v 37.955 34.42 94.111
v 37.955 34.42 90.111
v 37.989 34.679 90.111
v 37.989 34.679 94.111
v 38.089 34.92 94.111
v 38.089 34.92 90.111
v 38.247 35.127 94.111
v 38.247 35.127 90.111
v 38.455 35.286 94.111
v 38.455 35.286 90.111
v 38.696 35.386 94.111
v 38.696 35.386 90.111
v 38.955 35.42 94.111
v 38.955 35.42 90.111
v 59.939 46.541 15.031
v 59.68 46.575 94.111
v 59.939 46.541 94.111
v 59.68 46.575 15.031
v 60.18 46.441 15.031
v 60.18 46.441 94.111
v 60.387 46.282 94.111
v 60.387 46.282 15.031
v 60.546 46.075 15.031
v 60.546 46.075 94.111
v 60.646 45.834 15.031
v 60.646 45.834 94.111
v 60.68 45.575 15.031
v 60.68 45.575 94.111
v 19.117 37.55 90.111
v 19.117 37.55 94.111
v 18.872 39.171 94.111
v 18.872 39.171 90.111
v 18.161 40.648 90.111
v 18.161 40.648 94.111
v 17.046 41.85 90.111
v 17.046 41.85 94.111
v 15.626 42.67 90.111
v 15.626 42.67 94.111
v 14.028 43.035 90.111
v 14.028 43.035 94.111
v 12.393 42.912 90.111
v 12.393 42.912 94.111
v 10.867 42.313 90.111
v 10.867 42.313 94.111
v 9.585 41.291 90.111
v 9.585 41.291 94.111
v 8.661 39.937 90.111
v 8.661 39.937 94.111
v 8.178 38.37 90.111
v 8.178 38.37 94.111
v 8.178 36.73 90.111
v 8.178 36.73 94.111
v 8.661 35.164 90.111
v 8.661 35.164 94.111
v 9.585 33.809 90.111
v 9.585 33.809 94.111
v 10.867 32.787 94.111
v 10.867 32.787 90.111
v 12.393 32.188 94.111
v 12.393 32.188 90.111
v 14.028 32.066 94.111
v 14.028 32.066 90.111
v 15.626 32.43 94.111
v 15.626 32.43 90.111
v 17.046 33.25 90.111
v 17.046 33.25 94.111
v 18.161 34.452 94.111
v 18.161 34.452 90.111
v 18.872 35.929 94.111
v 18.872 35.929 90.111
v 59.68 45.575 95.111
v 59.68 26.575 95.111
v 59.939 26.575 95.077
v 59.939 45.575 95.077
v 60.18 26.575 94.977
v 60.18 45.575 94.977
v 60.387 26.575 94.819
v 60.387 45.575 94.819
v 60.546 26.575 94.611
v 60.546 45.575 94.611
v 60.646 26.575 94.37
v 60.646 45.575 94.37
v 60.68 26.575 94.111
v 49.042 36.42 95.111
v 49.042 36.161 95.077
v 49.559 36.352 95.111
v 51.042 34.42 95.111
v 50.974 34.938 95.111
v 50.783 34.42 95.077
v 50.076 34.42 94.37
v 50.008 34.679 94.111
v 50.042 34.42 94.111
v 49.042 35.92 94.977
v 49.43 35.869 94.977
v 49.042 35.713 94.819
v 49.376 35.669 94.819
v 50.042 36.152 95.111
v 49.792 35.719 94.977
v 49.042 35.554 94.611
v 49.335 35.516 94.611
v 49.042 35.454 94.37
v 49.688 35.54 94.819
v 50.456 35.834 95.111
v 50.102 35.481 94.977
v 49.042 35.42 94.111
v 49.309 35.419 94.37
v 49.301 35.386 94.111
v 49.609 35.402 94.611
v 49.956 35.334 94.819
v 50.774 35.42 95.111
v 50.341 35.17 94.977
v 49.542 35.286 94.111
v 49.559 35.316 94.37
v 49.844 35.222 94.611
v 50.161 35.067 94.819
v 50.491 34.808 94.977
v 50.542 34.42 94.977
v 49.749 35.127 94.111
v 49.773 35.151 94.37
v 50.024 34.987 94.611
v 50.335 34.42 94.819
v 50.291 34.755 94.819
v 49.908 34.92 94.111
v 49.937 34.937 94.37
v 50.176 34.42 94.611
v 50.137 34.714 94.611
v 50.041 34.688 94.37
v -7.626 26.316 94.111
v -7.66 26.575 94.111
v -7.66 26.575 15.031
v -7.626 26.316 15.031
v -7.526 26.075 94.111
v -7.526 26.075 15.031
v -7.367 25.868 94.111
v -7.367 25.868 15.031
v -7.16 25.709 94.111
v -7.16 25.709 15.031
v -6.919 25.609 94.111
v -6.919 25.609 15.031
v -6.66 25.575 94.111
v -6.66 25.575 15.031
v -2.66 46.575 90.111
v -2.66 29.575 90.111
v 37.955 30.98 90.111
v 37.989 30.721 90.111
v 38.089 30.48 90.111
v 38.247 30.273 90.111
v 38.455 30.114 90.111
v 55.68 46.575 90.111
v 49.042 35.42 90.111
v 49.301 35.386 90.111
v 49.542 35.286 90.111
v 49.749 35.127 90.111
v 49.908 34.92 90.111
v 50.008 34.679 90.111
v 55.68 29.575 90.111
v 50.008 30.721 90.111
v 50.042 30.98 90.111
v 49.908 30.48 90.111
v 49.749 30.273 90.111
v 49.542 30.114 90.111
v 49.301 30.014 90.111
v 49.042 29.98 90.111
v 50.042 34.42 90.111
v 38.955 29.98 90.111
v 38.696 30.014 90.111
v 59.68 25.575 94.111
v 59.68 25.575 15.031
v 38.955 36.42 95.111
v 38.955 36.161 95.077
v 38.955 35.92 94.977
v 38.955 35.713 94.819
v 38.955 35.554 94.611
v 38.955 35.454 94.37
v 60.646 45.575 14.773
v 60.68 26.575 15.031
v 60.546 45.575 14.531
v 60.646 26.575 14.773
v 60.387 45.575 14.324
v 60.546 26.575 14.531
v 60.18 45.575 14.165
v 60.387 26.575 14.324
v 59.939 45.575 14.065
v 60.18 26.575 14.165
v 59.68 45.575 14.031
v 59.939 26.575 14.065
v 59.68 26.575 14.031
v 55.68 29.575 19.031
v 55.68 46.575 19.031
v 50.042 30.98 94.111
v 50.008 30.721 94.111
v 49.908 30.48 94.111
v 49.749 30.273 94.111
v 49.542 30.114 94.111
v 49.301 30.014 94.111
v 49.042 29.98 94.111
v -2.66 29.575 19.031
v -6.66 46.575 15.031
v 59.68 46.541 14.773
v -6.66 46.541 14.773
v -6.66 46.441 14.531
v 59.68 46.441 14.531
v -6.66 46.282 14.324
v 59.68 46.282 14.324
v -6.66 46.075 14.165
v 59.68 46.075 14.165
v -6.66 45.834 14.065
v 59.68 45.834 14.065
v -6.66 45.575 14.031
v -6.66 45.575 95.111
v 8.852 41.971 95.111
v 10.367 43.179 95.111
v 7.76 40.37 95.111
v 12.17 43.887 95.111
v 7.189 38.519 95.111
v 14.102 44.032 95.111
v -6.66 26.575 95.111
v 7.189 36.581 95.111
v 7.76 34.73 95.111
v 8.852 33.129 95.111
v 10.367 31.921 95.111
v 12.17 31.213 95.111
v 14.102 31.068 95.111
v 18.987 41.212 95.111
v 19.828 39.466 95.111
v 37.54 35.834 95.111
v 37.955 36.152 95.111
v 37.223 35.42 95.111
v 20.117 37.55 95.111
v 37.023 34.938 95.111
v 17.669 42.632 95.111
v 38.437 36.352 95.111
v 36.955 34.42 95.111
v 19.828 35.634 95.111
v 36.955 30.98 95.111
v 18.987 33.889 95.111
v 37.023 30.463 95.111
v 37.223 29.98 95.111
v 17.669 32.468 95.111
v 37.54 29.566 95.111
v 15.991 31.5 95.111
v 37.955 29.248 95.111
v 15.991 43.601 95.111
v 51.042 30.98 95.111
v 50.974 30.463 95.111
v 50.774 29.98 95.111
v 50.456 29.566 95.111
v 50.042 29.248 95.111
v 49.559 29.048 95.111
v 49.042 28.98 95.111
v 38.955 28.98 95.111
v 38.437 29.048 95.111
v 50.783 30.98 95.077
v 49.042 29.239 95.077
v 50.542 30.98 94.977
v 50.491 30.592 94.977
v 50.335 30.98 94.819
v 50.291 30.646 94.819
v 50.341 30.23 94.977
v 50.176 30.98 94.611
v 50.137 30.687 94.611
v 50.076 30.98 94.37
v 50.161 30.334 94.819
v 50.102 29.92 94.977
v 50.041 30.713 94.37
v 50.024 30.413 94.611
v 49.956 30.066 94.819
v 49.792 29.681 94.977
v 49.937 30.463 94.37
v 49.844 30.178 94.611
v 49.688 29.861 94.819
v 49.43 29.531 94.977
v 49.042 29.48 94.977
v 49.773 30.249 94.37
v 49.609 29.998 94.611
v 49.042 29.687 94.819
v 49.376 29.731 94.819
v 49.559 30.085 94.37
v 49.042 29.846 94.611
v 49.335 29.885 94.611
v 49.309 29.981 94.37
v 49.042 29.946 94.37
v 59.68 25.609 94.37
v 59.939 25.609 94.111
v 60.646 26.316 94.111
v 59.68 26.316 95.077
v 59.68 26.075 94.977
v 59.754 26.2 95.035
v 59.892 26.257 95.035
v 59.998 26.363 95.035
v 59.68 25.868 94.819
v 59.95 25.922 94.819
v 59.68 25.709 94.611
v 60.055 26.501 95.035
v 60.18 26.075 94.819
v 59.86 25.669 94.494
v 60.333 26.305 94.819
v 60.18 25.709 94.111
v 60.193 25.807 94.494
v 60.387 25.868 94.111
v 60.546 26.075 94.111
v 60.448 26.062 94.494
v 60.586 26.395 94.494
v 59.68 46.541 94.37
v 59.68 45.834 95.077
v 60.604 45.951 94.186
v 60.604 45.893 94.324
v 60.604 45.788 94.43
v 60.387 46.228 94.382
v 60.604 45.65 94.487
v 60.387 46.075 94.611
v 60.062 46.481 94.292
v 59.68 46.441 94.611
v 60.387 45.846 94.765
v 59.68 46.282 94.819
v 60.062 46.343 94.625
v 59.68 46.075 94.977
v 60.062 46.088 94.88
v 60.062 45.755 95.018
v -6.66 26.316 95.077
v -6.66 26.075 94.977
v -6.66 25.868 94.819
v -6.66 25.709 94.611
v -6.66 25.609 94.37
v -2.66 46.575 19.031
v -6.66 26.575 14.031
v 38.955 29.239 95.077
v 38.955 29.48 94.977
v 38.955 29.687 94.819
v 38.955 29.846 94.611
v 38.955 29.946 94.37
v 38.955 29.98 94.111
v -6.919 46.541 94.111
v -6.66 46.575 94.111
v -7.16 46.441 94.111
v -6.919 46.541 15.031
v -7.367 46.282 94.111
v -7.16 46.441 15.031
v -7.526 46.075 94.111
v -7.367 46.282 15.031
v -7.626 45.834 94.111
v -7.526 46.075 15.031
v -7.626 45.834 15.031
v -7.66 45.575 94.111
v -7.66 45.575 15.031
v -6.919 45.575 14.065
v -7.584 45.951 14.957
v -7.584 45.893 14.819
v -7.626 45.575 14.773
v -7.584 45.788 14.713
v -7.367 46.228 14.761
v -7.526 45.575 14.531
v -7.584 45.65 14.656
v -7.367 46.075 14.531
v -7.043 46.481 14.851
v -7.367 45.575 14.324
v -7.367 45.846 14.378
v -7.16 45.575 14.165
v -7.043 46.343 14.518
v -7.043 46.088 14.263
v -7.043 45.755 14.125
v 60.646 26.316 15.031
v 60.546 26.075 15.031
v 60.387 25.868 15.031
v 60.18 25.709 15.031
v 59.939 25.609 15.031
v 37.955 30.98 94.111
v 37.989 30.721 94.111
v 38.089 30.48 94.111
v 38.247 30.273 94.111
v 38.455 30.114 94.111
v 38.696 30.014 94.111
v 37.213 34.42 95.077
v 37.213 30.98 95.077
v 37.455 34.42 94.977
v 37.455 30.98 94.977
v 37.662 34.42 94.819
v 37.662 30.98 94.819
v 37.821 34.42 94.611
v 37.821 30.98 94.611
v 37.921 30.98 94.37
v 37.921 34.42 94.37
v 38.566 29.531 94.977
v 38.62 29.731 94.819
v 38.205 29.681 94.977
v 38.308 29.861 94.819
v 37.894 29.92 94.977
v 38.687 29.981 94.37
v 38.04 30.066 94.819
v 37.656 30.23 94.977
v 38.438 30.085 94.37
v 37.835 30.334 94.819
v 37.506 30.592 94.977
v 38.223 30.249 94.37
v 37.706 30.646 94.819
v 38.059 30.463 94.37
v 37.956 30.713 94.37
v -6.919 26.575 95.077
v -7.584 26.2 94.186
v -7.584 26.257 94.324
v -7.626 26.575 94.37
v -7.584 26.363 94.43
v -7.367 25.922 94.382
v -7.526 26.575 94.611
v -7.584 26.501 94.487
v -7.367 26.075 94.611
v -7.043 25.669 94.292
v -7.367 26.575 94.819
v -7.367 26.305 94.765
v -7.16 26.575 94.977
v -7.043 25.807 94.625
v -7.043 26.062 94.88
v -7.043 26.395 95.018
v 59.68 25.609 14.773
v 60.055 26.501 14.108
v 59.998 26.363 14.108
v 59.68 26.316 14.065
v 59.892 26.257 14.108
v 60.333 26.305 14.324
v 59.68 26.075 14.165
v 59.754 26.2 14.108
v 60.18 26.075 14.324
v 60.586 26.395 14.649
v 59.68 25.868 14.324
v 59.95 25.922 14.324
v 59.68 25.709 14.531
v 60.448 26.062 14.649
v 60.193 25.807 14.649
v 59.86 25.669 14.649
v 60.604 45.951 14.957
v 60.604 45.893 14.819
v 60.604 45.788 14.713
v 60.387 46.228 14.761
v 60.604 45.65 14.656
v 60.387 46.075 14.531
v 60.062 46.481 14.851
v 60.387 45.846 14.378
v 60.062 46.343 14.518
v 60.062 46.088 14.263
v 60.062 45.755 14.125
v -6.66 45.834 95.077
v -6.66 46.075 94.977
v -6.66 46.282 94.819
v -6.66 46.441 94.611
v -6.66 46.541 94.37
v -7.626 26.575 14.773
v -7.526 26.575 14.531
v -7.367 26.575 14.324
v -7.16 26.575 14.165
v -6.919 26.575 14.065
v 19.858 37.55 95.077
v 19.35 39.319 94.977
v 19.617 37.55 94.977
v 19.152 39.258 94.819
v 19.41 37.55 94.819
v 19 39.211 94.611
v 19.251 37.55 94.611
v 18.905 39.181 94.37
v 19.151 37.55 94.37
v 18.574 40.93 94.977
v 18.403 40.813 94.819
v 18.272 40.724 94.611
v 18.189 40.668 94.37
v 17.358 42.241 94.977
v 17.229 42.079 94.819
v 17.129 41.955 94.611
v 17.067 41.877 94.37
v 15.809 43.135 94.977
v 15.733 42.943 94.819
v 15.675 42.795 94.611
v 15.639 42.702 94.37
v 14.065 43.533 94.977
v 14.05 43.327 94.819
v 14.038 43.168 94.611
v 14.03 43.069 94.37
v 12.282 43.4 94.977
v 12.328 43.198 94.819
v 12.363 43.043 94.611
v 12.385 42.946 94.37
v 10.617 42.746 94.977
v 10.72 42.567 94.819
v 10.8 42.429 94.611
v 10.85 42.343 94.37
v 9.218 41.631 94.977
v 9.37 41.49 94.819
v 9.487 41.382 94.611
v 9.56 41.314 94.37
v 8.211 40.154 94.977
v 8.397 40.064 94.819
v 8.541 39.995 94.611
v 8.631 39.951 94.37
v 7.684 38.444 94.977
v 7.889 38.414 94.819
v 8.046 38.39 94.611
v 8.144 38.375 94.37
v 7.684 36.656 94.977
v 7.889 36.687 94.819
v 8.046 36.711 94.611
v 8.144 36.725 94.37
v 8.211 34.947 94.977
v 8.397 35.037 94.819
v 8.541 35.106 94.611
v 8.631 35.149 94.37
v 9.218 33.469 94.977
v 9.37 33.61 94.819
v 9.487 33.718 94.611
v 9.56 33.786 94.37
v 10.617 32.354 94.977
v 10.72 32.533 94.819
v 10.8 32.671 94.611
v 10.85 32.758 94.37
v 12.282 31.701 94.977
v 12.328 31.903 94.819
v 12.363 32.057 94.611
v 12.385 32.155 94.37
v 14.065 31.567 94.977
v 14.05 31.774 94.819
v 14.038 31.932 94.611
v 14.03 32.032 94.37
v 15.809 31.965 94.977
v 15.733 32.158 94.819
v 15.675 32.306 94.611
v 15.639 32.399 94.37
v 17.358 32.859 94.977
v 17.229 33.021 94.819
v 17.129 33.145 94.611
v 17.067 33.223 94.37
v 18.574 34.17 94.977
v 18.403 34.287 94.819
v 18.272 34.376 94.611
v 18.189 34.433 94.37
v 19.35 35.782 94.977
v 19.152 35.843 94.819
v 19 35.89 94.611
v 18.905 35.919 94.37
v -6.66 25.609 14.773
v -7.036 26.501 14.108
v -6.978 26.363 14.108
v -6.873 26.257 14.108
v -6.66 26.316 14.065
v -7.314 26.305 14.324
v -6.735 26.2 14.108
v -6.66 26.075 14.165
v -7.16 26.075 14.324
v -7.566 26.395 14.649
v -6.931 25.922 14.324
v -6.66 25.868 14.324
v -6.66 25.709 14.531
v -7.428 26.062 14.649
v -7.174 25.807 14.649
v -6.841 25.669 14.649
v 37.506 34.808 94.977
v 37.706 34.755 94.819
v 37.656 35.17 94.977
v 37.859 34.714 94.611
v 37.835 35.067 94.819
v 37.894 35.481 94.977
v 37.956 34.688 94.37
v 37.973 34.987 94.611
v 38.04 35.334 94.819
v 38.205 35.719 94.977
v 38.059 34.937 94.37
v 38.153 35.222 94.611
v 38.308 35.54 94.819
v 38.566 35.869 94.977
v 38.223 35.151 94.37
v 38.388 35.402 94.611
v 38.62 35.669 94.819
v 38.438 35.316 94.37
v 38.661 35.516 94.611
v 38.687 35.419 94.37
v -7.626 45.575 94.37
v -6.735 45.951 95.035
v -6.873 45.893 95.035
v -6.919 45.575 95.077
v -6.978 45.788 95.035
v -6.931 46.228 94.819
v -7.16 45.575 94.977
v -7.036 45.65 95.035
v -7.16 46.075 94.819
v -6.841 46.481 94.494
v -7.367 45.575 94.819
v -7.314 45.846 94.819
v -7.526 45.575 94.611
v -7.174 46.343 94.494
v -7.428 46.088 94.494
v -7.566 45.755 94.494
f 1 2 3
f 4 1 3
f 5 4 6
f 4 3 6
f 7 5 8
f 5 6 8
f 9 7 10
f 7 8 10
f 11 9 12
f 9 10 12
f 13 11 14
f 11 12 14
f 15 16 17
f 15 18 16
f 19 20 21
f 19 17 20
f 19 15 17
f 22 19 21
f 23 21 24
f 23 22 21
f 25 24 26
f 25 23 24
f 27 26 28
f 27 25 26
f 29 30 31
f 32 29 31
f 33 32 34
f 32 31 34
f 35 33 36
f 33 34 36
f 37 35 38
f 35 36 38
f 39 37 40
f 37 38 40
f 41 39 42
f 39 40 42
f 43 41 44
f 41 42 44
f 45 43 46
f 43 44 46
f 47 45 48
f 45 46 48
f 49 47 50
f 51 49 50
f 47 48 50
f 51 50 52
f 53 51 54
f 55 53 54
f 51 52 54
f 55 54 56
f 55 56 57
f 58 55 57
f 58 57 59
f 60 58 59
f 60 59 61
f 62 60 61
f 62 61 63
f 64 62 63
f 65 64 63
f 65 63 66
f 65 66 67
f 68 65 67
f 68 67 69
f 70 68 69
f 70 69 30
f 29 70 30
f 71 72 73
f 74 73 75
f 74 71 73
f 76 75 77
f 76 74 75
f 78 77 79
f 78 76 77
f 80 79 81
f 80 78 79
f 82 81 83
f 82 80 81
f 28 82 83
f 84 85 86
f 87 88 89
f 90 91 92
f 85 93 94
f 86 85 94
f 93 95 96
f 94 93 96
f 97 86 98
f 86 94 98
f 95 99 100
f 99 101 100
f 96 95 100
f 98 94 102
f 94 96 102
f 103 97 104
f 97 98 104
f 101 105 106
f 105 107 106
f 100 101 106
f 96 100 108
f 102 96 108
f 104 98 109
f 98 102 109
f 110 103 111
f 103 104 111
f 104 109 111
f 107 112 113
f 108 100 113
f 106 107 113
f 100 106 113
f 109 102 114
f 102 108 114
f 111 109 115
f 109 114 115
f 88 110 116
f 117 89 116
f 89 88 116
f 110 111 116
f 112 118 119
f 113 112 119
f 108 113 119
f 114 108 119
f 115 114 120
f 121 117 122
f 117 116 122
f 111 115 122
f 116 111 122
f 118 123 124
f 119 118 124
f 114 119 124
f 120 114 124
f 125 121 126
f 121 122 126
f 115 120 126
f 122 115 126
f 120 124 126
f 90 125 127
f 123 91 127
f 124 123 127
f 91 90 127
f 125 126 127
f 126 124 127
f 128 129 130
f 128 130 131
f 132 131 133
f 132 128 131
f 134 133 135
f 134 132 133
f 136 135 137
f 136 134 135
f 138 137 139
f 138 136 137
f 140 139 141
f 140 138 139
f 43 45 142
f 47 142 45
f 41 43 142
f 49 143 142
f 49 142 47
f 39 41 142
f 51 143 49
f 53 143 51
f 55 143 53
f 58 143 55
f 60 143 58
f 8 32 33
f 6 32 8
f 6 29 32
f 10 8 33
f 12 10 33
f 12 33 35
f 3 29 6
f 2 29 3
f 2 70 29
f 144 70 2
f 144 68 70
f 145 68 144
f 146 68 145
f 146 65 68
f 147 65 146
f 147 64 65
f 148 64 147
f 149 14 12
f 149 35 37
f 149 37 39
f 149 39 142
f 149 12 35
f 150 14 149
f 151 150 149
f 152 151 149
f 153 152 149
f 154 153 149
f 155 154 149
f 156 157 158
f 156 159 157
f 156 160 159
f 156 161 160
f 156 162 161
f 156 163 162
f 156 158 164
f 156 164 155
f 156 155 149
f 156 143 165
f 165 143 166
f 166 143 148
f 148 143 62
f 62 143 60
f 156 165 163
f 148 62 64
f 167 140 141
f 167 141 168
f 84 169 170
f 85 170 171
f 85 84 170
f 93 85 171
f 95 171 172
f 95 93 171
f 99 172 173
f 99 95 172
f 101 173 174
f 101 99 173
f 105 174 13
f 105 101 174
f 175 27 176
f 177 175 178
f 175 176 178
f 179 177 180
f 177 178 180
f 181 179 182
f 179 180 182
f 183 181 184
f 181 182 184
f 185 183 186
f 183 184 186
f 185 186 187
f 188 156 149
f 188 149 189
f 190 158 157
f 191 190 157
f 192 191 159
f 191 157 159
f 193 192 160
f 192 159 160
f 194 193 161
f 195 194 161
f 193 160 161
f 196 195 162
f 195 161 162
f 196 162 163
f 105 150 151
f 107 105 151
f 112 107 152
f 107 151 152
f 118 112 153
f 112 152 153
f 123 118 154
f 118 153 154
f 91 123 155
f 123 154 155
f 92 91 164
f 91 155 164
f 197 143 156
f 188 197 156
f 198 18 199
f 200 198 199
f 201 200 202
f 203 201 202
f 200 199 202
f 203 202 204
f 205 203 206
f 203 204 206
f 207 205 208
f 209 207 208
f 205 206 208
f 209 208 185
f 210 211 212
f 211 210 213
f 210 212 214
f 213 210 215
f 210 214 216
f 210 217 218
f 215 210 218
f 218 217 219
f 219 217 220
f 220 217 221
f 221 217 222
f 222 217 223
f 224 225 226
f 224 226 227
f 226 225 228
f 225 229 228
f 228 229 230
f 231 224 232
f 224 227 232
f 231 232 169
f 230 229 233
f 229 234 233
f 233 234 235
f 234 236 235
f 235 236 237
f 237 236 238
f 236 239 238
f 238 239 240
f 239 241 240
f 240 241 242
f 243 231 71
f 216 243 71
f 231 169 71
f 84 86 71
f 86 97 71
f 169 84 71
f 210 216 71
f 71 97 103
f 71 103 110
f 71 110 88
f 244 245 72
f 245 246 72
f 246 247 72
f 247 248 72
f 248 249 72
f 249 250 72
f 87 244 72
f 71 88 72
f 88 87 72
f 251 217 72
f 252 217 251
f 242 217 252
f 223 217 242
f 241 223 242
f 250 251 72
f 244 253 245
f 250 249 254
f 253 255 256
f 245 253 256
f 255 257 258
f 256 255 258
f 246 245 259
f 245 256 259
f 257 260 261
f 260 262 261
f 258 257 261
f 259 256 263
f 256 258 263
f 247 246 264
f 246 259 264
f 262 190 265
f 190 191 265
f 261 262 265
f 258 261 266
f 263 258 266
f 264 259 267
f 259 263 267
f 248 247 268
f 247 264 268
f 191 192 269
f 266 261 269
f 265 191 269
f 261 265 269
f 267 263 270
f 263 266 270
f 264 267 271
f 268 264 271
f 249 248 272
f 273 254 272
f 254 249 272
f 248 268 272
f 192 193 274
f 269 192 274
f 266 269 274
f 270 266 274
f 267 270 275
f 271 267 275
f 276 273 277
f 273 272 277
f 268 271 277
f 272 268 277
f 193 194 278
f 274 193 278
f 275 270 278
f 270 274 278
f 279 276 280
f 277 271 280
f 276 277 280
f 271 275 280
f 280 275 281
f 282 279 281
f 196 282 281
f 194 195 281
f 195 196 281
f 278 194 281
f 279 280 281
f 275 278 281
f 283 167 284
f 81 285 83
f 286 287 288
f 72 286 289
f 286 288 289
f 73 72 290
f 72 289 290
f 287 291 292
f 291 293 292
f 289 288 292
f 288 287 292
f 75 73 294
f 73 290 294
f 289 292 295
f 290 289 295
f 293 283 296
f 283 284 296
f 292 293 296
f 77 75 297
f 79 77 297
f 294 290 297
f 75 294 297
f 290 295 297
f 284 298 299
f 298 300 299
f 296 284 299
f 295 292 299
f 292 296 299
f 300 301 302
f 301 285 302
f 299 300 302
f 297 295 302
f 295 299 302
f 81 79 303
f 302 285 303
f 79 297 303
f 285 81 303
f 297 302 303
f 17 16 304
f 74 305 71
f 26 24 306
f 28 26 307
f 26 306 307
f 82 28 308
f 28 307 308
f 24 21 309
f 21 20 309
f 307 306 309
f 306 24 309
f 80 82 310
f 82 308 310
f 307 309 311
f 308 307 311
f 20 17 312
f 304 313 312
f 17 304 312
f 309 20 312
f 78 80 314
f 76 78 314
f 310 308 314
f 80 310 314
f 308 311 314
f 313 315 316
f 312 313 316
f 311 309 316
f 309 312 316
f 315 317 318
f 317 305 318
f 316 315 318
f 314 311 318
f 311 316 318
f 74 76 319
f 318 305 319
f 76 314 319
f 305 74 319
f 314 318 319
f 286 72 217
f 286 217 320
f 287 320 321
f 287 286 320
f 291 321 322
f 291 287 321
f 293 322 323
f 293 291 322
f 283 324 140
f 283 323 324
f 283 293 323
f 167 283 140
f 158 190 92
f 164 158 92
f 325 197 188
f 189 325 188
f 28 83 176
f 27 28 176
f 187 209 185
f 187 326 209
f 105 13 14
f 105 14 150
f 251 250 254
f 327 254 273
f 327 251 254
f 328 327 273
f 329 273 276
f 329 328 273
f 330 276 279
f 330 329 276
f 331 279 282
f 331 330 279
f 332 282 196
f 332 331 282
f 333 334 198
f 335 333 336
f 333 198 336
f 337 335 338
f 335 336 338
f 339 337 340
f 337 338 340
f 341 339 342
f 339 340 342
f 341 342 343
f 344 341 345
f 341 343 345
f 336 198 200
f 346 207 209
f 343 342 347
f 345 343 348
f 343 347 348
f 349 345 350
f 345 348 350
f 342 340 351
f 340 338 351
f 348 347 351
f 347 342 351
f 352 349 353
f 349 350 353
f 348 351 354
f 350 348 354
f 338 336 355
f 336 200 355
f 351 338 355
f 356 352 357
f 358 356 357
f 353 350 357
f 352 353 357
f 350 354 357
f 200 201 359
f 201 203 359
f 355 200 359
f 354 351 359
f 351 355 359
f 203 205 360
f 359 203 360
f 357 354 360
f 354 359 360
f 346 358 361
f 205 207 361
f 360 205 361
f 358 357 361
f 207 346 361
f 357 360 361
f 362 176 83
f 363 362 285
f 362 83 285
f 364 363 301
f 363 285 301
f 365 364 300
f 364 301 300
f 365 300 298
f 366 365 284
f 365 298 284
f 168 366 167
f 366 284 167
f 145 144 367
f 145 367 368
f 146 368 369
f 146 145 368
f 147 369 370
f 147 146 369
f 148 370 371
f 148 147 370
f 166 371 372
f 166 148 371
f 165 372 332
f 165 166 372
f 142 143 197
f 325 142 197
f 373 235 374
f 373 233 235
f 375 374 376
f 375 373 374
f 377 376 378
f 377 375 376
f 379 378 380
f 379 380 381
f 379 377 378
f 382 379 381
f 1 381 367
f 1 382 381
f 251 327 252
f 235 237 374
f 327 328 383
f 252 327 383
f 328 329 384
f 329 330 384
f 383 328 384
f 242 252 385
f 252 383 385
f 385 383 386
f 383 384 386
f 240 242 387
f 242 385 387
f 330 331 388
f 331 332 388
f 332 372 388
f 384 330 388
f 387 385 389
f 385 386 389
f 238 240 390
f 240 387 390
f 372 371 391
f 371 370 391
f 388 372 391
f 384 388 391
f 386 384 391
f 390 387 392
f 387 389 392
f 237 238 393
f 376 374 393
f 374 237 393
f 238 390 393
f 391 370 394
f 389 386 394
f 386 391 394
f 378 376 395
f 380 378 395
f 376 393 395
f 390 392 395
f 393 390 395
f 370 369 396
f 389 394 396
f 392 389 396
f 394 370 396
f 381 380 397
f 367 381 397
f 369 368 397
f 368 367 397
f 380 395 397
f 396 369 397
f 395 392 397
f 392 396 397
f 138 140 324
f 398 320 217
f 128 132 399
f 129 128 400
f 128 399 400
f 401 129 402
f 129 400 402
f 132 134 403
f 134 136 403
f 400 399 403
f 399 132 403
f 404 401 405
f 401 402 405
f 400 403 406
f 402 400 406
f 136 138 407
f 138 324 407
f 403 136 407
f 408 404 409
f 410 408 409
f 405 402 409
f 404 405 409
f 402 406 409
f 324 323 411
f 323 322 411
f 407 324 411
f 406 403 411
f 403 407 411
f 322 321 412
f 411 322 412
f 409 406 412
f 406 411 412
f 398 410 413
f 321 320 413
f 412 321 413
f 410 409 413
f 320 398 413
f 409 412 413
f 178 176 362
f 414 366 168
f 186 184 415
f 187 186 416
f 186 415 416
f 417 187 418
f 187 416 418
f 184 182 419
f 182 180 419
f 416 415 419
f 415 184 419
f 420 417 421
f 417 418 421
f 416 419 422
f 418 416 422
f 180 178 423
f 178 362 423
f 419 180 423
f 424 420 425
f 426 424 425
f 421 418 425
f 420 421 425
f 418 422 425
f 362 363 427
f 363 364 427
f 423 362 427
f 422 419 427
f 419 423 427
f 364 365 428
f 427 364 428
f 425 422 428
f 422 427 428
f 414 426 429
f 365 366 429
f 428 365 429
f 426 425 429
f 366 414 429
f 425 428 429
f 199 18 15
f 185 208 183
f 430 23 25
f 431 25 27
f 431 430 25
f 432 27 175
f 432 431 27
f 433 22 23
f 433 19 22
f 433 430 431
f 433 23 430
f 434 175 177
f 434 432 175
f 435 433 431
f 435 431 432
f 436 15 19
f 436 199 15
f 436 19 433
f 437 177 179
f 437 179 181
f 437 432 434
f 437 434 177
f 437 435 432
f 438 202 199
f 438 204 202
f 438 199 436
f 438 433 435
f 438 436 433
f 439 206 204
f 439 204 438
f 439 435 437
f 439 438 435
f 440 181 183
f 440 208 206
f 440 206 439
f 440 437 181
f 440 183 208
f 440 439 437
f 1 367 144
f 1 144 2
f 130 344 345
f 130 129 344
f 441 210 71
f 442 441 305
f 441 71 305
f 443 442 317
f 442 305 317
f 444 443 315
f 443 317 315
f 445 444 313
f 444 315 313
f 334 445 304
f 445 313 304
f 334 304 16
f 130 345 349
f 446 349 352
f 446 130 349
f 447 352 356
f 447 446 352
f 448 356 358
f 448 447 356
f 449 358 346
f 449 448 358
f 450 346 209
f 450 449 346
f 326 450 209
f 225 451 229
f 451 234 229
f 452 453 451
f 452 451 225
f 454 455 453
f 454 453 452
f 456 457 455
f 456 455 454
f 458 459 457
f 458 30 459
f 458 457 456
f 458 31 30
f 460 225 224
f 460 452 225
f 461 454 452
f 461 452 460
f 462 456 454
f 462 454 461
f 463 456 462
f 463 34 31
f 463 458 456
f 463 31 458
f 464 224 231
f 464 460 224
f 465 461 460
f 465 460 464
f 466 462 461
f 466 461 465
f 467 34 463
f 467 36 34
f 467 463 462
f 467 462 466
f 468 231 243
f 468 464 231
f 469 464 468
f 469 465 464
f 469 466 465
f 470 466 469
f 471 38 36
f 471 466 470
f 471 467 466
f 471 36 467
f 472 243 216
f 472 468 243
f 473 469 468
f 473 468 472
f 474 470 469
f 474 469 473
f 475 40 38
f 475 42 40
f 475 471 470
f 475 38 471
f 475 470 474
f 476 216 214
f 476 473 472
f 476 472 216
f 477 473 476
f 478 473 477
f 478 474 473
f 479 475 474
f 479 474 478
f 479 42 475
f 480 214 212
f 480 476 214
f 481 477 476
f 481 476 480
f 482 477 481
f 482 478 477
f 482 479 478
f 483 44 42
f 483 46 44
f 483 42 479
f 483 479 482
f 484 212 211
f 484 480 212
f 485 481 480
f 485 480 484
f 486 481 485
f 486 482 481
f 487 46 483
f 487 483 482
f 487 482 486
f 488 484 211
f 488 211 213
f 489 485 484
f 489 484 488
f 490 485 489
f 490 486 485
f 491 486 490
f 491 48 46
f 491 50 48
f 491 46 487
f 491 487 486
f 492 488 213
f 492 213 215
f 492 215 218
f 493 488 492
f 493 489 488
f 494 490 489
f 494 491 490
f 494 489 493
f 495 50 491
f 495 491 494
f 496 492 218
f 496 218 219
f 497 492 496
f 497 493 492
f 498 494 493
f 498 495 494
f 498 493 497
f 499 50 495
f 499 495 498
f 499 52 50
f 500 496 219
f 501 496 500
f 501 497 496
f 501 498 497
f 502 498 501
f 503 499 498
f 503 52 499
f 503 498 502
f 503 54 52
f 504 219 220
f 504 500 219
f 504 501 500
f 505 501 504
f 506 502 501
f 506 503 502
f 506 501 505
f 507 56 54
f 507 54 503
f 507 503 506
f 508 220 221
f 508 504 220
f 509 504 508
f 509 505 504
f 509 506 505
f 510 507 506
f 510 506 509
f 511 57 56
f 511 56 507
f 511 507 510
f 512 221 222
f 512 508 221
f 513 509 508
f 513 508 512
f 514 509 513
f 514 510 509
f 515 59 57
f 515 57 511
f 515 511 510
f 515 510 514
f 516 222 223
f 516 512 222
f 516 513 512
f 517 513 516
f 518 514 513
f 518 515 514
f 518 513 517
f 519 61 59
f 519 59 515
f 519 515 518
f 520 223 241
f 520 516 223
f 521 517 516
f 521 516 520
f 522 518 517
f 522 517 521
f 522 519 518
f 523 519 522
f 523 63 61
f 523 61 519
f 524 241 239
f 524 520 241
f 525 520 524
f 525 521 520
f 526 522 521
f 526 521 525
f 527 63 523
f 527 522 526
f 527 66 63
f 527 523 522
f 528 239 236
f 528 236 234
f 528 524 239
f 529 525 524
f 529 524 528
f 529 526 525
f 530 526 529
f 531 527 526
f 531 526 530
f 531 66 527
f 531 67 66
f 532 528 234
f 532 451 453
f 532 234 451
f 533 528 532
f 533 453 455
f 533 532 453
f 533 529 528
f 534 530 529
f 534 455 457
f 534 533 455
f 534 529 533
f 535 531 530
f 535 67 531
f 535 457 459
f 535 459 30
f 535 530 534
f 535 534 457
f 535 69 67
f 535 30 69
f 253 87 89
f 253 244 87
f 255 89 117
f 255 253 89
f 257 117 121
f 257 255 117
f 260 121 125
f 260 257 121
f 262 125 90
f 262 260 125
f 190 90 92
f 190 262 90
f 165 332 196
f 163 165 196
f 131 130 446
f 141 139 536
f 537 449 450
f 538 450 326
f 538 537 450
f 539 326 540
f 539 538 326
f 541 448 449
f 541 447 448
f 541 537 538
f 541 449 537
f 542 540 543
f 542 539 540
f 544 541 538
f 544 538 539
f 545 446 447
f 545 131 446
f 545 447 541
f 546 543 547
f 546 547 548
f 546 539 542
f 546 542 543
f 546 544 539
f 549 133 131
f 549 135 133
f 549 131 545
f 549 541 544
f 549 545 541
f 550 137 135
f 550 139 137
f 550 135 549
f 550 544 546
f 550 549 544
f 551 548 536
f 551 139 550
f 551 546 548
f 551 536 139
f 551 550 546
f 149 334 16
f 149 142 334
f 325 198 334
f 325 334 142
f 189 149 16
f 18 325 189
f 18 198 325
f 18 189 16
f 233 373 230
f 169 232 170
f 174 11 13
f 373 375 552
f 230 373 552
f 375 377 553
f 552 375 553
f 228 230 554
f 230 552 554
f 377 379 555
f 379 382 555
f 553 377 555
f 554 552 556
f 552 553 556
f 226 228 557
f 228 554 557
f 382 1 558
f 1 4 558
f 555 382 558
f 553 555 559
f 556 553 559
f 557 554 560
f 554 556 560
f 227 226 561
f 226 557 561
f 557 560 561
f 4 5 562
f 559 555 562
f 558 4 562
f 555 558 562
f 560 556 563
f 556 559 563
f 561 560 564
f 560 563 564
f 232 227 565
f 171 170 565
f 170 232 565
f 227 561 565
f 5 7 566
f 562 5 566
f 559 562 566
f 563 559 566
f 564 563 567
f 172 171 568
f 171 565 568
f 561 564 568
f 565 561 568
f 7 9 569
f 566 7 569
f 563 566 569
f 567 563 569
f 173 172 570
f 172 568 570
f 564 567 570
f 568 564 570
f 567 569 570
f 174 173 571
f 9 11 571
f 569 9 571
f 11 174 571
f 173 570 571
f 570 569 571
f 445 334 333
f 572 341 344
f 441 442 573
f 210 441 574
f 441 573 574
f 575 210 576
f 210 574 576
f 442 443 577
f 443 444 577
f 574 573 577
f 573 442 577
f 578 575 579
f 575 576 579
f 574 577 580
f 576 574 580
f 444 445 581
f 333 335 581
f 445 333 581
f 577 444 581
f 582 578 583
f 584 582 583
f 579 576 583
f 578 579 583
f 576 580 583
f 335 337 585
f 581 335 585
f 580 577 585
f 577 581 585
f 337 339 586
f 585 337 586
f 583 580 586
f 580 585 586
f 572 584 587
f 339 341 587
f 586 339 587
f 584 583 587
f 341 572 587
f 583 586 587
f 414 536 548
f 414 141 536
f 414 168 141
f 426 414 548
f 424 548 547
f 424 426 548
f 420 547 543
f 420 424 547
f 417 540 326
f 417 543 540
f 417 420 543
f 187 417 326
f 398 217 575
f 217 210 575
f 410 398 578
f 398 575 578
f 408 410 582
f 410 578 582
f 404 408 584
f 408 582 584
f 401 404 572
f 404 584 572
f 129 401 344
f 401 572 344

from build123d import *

# Parameters (mm, degrees)
CROQUIS1_W              = 68.34
CROQUIS1_H              = 81.08
SALIENTE_EXTRUIR1_DEPTH = 4
CROQUIS2_W              = 68.34
CROQUIS2_H              = 81.08
CROQUIS2_W_2            = 58.34
CROQUIS2_H_2            = 71.08
SALIENTE_EXTRUIR2_DEPTH = 17
CROQUIS3_R              = 5.5
CROQUIS3_W              = 12.087237368
CROQUIS3_H              = 5.44
CORTAR_EXTRUIR1_DEPTH   = 8
REDONDEO1_R             = 1
REDONDEO2_R             = 1


with BuildPart() as part:
    # Croquis1 → Saliente-Extruir1 (new body)
    with BuildSketch(Plane.XZ.offset(-29.575210532)):
        with Locations((26.509736299, 54.571399583)):
            Rectangle(CROQUIS1_W, CROQUIS1_H)
    extrude(amount=SALIENTE_EXTRUIR1_DEPTH)

    # Croquis2 → Saliente-Extruir2 (add)
    with BuildSketch(Plane(origin=(0, 29.575210532, 0), x_dir=(1, 0, 0), z_dir=(0, 1, 0))):
        with Locations((26.509736299, -54.571399583)):
            Rectangle(CROQUIS2_W, CROQUIS2_H)
        with Locations((26.509736299, -54.571399583)):
            Rectangle(CROQUIS2_W_2, CROQUIS2_H_2, mode=Mode.SUBTRACT)
    extrude(amount=SALIENTE_EXTRUIR2_DEPTH)

    # Croquis3 → Cortar-Extruir1 (cut)
    with BuildSketch(Plane.XY.offset(95.111399583)):
        with Locations((13.616696299, 37.550210532)):
            Circle(CROQUIS3_R)
        with Locations((43.998193346, 32.700210532)):
            Rectangle(CROQUIS3_W, CROQUIS3_H)
    extrude(amount=-CORTAR_EXTRUIR1_DEPTH, mode=Mode.SUBTRACT)

    # Redondeo1
    redondeo1_edges = [part.edges().sort_by_distance(p)[0] for p in [
        (37.954574662, 29.980210532, 92.611399583),
        (37.954574662, 35.420210532, 92.611399583),
        (50.04181203, 35.420210532, 92.611399583),
        (50.04181203, 29.980210532, 92.611399583),
    ]]
    fillet(redondeo1_edges, radius=REDONDEO1_R)

    # Redondeo2
    redondeo2_edges = [part.edges().sort_by_distance(p)[0] for p in [
        (60.679736299, 25.575210532, 54.571399583),
        (26.509736299, 46.575210532, 14.031399583),
        (-7.660263701, 46.575210532, 54.571399583),
        (26.509736299, 46.575210532, 95.111399583),
        (60.679736299, 46.575210532, 54.571399583),
        (26.509736299, 25.575210532, 95.111399583),
        (-7.660263701, 25.575210532, 54.571399583),
        (8.116696299, 37.550210532, 95.111399583),
        (37.954574662, 32.700210532, 95.111399583),
        (43.998193346, 35.420210532, 95.111399583),
        (50.04181203, 32.700210532, 95.111399583),
        (43.998193346, 29.980210532, 95.111399583),
        (38.247467881, 35.127317313, 95.111399583),
        (49.748918811, 35.127317313, 95.111399583),
        (49.748918811, 30.27310375, 95.111399583),
        (38.247467881, 30.27310375, 95.111399583),
        (-7.660263701, 36.075210532, 95.111399583),
        (60.679736299, 36.075210532, 95.111399583),
        (60.679736299, 36.075210532, 14.031399583),
        (-7.660263701, 36.075210532, 14.031399583),
        (26.509736299, 25.575210532, 14.031399583),
    ]]
    fillet(redondeo2_edges, radius=REDONDEO2_R)


solid = part.part
